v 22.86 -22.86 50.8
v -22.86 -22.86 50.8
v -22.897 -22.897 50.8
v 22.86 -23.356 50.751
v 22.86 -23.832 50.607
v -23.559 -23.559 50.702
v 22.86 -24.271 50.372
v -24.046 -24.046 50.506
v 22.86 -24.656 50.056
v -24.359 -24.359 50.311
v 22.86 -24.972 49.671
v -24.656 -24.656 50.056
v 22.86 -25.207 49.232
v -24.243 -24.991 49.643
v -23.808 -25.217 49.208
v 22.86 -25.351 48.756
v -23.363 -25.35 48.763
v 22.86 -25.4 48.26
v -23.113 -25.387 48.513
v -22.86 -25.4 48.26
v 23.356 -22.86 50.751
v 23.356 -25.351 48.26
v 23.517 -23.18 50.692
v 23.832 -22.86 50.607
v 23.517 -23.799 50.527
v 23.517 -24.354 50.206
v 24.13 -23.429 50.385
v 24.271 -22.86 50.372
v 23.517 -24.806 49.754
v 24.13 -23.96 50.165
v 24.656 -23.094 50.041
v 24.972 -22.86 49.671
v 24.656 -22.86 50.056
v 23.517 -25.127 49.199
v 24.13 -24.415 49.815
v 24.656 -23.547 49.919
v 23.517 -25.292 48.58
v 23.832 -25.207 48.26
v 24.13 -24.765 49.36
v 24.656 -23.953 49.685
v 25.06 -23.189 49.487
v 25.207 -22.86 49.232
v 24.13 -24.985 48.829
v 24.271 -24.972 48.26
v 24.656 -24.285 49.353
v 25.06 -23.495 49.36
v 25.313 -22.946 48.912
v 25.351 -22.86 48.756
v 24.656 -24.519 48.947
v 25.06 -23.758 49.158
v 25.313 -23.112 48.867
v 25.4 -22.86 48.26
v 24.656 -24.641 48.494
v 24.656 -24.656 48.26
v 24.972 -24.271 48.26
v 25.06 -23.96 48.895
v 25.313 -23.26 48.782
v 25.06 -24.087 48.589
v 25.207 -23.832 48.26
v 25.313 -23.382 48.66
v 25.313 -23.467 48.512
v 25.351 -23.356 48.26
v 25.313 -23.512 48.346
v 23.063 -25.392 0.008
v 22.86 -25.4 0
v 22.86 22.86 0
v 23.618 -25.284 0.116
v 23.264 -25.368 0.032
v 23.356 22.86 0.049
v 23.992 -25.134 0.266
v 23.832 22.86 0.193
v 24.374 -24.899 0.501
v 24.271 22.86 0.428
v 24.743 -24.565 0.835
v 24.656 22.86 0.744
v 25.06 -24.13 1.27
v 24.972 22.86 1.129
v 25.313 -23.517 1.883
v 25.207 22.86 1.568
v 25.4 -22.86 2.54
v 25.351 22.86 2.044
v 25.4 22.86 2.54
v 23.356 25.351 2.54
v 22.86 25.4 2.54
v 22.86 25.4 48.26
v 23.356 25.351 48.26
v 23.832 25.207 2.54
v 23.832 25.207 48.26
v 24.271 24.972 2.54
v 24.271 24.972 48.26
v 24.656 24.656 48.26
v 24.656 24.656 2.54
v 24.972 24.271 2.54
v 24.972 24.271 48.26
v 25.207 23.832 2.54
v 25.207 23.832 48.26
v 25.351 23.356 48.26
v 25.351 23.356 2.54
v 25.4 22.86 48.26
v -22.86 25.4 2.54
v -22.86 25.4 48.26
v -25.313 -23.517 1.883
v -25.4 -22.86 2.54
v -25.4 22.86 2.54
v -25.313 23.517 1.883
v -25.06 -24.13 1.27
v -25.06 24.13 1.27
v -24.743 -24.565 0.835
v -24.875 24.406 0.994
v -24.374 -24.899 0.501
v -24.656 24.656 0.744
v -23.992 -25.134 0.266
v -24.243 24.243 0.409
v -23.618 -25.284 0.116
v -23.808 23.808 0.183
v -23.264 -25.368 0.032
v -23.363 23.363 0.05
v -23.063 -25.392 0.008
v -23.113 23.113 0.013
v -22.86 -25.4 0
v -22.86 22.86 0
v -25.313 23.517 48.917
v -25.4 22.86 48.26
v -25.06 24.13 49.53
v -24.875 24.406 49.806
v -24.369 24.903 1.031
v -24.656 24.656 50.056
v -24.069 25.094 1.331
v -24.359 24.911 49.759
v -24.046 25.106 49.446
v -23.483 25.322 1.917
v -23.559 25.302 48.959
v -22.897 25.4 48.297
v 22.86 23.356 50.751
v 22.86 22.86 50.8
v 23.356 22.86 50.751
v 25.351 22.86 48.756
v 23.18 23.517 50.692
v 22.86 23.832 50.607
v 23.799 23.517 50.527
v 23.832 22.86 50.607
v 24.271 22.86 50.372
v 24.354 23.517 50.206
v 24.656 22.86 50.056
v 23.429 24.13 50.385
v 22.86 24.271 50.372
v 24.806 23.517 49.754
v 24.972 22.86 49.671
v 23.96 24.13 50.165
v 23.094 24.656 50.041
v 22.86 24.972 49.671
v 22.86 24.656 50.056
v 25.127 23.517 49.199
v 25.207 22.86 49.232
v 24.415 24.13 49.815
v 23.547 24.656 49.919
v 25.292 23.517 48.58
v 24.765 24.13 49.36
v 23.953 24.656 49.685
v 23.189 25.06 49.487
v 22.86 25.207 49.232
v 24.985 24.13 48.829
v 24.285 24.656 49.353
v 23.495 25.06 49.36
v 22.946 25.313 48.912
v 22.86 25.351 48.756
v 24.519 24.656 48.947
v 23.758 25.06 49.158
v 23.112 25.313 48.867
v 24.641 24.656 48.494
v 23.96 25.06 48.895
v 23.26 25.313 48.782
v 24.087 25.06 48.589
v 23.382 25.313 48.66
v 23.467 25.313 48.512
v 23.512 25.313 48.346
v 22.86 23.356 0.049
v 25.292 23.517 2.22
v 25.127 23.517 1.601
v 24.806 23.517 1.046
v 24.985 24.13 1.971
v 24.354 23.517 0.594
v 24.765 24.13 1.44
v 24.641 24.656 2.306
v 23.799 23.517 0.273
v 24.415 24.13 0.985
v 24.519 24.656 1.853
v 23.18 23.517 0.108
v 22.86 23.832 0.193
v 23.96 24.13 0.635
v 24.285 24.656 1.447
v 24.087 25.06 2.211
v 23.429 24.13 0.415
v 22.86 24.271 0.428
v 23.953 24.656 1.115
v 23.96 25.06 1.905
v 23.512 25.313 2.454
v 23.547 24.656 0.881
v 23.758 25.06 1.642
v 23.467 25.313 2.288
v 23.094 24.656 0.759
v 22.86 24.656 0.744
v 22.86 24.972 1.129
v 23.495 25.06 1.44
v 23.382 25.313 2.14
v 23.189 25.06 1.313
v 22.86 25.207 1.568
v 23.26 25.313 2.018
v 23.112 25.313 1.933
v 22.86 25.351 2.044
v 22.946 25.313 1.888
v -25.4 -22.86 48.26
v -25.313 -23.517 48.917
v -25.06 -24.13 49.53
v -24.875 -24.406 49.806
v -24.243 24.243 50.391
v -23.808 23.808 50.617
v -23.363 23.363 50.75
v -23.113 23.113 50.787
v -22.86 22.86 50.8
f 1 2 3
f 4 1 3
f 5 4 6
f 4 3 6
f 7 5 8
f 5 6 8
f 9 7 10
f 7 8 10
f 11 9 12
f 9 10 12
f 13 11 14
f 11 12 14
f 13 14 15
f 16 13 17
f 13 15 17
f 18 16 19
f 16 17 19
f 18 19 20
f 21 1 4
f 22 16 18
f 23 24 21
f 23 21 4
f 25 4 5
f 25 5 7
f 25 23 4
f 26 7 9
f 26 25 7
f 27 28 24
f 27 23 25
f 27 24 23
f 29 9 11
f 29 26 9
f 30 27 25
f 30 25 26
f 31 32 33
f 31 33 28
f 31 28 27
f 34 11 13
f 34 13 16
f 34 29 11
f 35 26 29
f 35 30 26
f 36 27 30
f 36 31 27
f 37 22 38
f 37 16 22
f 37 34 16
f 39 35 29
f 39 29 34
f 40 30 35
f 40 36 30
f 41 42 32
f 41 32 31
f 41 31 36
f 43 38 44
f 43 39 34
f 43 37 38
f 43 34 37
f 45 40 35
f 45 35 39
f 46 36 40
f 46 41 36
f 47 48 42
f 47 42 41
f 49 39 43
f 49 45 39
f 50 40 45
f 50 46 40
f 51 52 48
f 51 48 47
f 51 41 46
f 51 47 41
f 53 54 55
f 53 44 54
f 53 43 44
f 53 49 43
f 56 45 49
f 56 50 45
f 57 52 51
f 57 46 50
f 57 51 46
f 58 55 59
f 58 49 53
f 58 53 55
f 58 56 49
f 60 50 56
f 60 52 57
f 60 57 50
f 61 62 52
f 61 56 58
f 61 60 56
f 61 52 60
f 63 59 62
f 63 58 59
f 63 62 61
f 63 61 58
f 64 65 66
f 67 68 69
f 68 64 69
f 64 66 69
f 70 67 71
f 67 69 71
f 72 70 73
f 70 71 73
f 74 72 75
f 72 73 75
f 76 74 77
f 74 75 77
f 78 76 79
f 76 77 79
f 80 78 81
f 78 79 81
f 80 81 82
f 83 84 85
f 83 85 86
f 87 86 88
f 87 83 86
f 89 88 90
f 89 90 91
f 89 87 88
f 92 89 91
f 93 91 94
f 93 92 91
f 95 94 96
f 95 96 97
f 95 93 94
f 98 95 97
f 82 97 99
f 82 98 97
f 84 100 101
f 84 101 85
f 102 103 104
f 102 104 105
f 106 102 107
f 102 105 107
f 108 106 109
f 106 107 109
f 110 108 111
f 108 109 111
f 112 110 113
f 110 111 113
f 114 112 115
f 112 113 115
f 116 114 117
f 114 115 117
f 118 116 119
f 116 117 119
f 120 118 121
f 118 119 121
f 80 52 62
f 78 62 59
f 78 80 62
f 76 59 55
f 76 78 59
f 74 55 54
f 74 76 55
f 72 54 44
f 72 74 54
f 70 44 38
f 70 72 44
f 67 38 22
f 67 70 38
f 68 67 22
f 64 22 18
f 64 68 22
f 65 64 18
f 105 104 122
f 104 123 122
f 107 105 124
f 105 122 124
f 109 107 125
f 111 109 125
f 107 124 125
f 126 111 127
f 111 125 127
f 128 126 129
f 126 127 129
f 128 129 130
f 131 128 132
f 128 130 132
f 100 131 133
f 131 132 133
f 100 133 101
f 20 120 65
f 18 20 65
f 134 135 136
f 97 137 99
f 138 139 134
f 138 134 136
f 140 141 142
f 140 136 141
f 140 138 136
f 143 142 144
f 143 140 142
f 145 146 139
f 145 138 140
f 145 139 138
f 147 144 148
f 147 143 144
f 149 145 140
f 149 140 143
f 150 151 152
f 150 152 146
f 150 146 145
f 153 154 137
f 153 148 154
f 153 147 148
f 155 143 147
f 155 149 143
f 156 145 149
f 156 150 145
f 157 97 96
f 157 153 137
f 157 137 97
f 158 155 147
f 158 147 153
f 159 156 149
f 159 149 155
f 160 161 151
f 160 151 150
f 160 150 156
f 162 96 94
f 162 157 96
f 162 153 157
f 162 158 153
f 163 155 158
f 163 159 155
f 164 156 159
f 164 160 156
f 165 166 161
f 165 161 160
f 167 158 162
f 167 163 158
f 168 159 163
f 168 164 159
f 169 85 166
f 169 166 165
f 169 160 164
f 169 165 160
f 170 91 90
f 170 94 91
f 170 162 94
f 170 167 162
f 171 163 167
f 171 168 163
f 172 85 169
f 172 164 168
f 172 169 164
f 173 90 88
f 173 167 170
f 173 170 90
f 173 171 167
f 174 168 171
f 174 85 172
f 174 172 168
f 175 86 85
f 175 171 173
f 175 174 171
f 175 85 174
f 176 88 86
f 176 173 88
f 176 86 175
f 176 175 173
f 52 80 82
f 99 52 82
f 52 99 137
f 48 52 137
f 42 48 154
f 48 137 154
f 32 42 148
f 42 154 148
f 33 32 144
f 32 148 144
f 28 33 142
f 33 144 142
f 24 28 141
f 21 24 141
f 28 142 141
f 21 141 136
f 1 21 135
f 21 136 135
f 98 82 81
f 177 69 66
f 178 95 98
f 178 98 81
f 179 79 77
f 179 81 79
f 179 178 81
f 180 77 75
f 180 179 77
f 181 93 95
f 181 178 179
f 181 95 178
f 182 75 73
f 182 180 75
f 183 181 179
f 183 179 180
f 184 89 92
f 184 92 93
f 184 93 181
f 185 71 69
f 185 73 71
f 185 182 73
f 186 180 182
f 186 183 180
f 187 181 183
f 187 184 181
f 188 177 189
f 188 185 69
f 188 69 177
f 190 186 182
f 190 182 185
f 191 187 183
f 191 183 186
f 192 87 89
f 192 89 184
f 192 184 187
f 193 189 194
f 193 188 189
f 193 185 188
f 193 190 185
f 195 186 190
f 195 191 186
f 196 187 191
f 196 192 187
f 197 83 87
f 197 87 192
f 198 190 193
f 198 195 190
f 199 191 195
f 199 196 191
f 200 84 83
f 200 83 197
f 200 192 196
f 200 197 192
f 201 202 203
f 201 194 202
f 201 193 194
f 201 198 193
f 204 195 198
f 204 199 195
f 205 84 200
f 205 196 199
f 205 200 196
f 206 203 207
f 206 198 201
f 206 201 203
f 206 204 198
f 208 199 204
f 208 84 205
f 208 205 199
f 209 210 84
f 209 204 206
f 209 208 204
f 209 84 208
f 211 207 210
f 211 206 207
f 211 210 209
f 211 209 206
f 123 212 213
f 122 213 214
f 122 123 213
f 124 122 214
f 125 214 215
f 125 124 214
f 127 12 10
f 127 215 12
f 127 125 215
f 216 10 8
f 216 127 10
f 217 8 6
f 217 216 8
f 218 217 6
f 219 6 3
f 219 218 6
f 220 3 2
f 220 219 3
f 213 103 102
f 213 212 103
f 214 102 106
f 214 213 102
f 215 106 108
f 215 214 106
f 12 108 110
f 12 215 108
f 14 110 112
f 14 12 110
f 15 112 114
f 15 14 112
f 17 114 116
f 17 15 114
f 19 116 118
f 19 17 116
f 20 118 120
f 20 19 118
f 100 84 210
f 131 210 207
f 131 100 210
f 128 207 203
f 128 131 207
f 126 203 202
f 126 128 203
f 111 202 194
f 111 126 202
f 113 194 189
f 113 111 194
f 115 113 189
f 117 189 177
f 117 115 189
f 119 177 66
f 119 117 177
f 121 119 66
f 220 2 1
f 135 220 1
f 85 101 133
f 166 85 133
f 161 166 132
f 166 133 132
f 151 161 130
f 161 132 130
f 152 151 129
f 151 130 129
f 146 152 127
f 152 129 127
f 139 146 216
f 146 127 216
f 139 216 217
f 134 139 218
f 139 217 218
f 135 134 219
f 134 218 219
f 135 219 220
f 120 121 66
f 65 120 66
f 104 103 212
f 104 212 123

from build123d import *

# Parameters (mm, degrees)
F0_W         = 50.8
F0_H         = 50.8
F1_DEPTH     = 50.8
F2_R         = 2.54
F3_T1_DEPTH  = 52.07
F3_T3_DEPTH  = 45.72
F3_T5_DEPTH  = 54.61
F3_T7_DEPTH  = 45.72
F3_T9_DEPTH  = 54.61
F3_S13_W     = 2.5908
F3_S13_H     = 2.5908
F3_T14_DEPTH = 2.5908
F3_S19_W     = 2.5908
F3_S19_H     = 2.5908
F3_T20_DEPTH = 2.5908
F3_S25_W     = 2.5908
F3_S25_H     = 2.5908
F3_T26_DEPTH = 2.5908


# Not quite as in the source:
# - a fillet or chamfer that OpenCascade refuses, or shapes differently, is made with other operations: its cross-section is extruded or revolved along the edge and cut away or added


with BuildPart() as f1:
    # F0 (on Top) → F1 (new body)
    with BuildSketch(Plane.XY):
        Rectangle(F0_W, F0_H)
    extrude(amount=F1_DEPTH)

    # F2
    f2_edges = [f1.edges().sort_by_distance(p)[0] for p in [
        (-25.4, 25.4, 25.4),
        (-25.4, -25.4, 25.4),
        (-25.4, 0, 0),
        (-25.4, 0, 50.8),
    ]]
    fillet(f2_edges, radius=F2_R)

    # F3: fillet of radius 2.54 on 9 edges, made by hand

    # F3_s2 → F3_t1 (cut)
    with BuildSketch(Plane.YZ.offset(-29.21)):
        with BuildLine():
            ThreePointArc((25.4, 48.26), (24.6560512242, 50.0560512242), (22.86, 50.8))
            Line((22.86, 50.8), (25.4, 50.8))
            Line((25.4, 50.8), (25.4, 48.26))
        make_face()
        with BuildLine():
            ThreePointArc((-22.86, 50.8), (-24.6560512242, 50.0560512242), (-25.4, 48.26))
            Line((-25.4, 48.26), (-25.4, 50.8))
            Line((-25.4, 50.8), (-22.86, 50.8))
        make_face()
        with BuildLine():
            ThreePointArc((25.4, 2.54), (24.6560512242, 0.7439487758), (22.86, 0))
            Line((22.86, 0), (25.4, 0))
            Line((25.4, 0), (25.4, 2.54))
        make_face()
    extrude(amount=F3_T1_DEPTH, mode=Mode.SUBTRACT)

    # F3_s4 → F3_t3 (cut)
    with BuildSketch(Plane.XZ.offset(-22.86)):
        with BuildLine():
            ThreePointArc((25.4, 48.26), (24.6560512242, 50.0560512242), (22.86, 50.8))
            Line((22.86, 50.8), (25.4, 50.8))
            Line((25.4, 50.8), (25.4, 48.26))
        make_face()
    extrude(amount=F3_T3_DEPTH, mode=Mode.SUBTRACT)

    # F3_s6 → F3_t5 (cut)
    with BuildSketch(Plane.XY.offset(-6.35)):
        with BuildLine():
            ThreePointArc((25.4, -22.86), (24.6560512242, -24.6560512242), (22.86, -25.4))
            Line((22.86, -25.4), (25.4, -25.4))
            Line((25.4, -25.4), (25.4, -22.86))
        make_face()
    extrude(amount=F3_T5_DEPTH, mode=Mode.SUBTRACT)

    # F3_s8 → F3_t7 (cut)
    with BuildSketch(Plane.XY.offset(2.54)):
        with BuildLine():
            ThreePointArc((22.86, 25.4), (24.6560512242, 24.6560512242), (25.4, 22.86))
            Line((25.4, 22.86), (25.4, 25.4))
            Line((25.4, 25.4), (22.86, 25.4))
        make_face()
    extrude(amount=F3_T7_DEPTH, mode=Mode.SUBTRACT)

    # F3_s10 → F3_t9 (cut)
    with BuildSketch(Plane.XZ.offset(-22.86)):
        with BuildLine():
            ThreePointArc((22.86, 0), (24.6560512242, 0.7439487758), (25.4, 2.54))
            Line((25.4, 2.54), (25.4, 0))
            Line((25.4, 0), (22.86, 0))
        make_face()
    extrude(amount=F3_T9_DEPTH, mode=Mode.SUBTRACT)


with BuildPart() as f3_tool12:
    # F3_s13 → F3_t14 (new body)
    with BuildSketch(Plane.XZ.offset(-22.86)):
        with Locations((24.1554, 49.5554)):
            Rectangle(F3_S13_W, F3_S13_H)
    extrude(amount=-F3_T14_DEPTH)

    # F3_s15 → F3_t16 (revolve, cut)
    with BuildSketch(Plane(origin=(22.86, 22.86, 48.26), x_dir=(-0.7071067812, 0, -0.7071067812), z_dir=(0.7071067812, 0, -0.7071067812))):
        with BuildLine():
            ThreePointArc((0, -2.54), (2.54, 0), (0, 2.54))
            Line((0, 2.54), (0, -2.54))
        make_face()
    revolve(axis=Axis((22.86, 22.86, 48.26), (0, 1, 0)), mode=Mode.SUBTRACT)


with BuildPart() as f1_1:
    add(f1.part)

    # F3_t11: cut F3_tool12
    add(f3_tool12.part, mode=Mode.SUBTRACT)


with BuildPart() as f3_tool18:
    # F3_s19 → F3_t20 (new body)
    with BuildSketch(Plane.YZ.offset(22.86)):
        with Locations((-24.1554, 49.5554)):
            Rectangle(F3_S19_W, F3_S19_H)
    extrude(amount=F3_T20_DEPTH)

    # F3_s21 → F3_t22 (revolve, cut)
    with BuildSketch(Plane(origin=(22.86, -22.86, 48.26), x_dir=(0, 0.7071067812, -0.7071067812), z_dir=(0, -0.7071067812, -0.7071067812))):
        with BuildLine():
            ThreePointArc((0, -2.54), (2.54, 0), (0, 2.54))
            Line((0, 2.54), (0, -2.54))
        make_face()
    revolve(axis=Axis((22.86, -22.86, 48.26), (1, 0, 0)), mode=Mode.SUBTRACT)


with BuildPart() as f1_2:
    add(f1_1.part)

    # F3_t17: cut F3_tool18
    add(f3_tool18.part, mode=Mode.SUBTRACT)


with BuildPart() as f3_tool24:
    # F3_s25 → F3_t26 (new body)
    with BuildSketch(Plane.XZ.offset(-22.86)):
        with Locations((24.1554, 1.2446)):
            Rectangle(F3_S25_W, F3_S25_H)
    extrude(amount=-F3_T26_DEPTH)

    # F3_s27 → F3_t28 (revolve, cut)
    with BuildSketch(Plane(origin=(22.86, 22.86, 2.54), x_dir=(-0.7071067812, 0, 0.7071067812), z_dir=(-0.7071067812, 0, -0.7071067812))):
        with BuildLine():
            ThreePointArc((0, -2.54), (2.54, 0), (0, 2.54))
            Line((0, 2.54), (0, -2.54))
        make_face()
    revolve(axis=Axis((22.86, 22.86, 2.54), (0, 1, 0)), mode=Mode.SUBTRACT)


with BuildPart() as f1_3:
    add(f1_2.part)

    # F3_t23: cut F3_tool24
    add(f3_tool24.part, mode=Mode.SUBTRACT)


solid = f1_3.part
